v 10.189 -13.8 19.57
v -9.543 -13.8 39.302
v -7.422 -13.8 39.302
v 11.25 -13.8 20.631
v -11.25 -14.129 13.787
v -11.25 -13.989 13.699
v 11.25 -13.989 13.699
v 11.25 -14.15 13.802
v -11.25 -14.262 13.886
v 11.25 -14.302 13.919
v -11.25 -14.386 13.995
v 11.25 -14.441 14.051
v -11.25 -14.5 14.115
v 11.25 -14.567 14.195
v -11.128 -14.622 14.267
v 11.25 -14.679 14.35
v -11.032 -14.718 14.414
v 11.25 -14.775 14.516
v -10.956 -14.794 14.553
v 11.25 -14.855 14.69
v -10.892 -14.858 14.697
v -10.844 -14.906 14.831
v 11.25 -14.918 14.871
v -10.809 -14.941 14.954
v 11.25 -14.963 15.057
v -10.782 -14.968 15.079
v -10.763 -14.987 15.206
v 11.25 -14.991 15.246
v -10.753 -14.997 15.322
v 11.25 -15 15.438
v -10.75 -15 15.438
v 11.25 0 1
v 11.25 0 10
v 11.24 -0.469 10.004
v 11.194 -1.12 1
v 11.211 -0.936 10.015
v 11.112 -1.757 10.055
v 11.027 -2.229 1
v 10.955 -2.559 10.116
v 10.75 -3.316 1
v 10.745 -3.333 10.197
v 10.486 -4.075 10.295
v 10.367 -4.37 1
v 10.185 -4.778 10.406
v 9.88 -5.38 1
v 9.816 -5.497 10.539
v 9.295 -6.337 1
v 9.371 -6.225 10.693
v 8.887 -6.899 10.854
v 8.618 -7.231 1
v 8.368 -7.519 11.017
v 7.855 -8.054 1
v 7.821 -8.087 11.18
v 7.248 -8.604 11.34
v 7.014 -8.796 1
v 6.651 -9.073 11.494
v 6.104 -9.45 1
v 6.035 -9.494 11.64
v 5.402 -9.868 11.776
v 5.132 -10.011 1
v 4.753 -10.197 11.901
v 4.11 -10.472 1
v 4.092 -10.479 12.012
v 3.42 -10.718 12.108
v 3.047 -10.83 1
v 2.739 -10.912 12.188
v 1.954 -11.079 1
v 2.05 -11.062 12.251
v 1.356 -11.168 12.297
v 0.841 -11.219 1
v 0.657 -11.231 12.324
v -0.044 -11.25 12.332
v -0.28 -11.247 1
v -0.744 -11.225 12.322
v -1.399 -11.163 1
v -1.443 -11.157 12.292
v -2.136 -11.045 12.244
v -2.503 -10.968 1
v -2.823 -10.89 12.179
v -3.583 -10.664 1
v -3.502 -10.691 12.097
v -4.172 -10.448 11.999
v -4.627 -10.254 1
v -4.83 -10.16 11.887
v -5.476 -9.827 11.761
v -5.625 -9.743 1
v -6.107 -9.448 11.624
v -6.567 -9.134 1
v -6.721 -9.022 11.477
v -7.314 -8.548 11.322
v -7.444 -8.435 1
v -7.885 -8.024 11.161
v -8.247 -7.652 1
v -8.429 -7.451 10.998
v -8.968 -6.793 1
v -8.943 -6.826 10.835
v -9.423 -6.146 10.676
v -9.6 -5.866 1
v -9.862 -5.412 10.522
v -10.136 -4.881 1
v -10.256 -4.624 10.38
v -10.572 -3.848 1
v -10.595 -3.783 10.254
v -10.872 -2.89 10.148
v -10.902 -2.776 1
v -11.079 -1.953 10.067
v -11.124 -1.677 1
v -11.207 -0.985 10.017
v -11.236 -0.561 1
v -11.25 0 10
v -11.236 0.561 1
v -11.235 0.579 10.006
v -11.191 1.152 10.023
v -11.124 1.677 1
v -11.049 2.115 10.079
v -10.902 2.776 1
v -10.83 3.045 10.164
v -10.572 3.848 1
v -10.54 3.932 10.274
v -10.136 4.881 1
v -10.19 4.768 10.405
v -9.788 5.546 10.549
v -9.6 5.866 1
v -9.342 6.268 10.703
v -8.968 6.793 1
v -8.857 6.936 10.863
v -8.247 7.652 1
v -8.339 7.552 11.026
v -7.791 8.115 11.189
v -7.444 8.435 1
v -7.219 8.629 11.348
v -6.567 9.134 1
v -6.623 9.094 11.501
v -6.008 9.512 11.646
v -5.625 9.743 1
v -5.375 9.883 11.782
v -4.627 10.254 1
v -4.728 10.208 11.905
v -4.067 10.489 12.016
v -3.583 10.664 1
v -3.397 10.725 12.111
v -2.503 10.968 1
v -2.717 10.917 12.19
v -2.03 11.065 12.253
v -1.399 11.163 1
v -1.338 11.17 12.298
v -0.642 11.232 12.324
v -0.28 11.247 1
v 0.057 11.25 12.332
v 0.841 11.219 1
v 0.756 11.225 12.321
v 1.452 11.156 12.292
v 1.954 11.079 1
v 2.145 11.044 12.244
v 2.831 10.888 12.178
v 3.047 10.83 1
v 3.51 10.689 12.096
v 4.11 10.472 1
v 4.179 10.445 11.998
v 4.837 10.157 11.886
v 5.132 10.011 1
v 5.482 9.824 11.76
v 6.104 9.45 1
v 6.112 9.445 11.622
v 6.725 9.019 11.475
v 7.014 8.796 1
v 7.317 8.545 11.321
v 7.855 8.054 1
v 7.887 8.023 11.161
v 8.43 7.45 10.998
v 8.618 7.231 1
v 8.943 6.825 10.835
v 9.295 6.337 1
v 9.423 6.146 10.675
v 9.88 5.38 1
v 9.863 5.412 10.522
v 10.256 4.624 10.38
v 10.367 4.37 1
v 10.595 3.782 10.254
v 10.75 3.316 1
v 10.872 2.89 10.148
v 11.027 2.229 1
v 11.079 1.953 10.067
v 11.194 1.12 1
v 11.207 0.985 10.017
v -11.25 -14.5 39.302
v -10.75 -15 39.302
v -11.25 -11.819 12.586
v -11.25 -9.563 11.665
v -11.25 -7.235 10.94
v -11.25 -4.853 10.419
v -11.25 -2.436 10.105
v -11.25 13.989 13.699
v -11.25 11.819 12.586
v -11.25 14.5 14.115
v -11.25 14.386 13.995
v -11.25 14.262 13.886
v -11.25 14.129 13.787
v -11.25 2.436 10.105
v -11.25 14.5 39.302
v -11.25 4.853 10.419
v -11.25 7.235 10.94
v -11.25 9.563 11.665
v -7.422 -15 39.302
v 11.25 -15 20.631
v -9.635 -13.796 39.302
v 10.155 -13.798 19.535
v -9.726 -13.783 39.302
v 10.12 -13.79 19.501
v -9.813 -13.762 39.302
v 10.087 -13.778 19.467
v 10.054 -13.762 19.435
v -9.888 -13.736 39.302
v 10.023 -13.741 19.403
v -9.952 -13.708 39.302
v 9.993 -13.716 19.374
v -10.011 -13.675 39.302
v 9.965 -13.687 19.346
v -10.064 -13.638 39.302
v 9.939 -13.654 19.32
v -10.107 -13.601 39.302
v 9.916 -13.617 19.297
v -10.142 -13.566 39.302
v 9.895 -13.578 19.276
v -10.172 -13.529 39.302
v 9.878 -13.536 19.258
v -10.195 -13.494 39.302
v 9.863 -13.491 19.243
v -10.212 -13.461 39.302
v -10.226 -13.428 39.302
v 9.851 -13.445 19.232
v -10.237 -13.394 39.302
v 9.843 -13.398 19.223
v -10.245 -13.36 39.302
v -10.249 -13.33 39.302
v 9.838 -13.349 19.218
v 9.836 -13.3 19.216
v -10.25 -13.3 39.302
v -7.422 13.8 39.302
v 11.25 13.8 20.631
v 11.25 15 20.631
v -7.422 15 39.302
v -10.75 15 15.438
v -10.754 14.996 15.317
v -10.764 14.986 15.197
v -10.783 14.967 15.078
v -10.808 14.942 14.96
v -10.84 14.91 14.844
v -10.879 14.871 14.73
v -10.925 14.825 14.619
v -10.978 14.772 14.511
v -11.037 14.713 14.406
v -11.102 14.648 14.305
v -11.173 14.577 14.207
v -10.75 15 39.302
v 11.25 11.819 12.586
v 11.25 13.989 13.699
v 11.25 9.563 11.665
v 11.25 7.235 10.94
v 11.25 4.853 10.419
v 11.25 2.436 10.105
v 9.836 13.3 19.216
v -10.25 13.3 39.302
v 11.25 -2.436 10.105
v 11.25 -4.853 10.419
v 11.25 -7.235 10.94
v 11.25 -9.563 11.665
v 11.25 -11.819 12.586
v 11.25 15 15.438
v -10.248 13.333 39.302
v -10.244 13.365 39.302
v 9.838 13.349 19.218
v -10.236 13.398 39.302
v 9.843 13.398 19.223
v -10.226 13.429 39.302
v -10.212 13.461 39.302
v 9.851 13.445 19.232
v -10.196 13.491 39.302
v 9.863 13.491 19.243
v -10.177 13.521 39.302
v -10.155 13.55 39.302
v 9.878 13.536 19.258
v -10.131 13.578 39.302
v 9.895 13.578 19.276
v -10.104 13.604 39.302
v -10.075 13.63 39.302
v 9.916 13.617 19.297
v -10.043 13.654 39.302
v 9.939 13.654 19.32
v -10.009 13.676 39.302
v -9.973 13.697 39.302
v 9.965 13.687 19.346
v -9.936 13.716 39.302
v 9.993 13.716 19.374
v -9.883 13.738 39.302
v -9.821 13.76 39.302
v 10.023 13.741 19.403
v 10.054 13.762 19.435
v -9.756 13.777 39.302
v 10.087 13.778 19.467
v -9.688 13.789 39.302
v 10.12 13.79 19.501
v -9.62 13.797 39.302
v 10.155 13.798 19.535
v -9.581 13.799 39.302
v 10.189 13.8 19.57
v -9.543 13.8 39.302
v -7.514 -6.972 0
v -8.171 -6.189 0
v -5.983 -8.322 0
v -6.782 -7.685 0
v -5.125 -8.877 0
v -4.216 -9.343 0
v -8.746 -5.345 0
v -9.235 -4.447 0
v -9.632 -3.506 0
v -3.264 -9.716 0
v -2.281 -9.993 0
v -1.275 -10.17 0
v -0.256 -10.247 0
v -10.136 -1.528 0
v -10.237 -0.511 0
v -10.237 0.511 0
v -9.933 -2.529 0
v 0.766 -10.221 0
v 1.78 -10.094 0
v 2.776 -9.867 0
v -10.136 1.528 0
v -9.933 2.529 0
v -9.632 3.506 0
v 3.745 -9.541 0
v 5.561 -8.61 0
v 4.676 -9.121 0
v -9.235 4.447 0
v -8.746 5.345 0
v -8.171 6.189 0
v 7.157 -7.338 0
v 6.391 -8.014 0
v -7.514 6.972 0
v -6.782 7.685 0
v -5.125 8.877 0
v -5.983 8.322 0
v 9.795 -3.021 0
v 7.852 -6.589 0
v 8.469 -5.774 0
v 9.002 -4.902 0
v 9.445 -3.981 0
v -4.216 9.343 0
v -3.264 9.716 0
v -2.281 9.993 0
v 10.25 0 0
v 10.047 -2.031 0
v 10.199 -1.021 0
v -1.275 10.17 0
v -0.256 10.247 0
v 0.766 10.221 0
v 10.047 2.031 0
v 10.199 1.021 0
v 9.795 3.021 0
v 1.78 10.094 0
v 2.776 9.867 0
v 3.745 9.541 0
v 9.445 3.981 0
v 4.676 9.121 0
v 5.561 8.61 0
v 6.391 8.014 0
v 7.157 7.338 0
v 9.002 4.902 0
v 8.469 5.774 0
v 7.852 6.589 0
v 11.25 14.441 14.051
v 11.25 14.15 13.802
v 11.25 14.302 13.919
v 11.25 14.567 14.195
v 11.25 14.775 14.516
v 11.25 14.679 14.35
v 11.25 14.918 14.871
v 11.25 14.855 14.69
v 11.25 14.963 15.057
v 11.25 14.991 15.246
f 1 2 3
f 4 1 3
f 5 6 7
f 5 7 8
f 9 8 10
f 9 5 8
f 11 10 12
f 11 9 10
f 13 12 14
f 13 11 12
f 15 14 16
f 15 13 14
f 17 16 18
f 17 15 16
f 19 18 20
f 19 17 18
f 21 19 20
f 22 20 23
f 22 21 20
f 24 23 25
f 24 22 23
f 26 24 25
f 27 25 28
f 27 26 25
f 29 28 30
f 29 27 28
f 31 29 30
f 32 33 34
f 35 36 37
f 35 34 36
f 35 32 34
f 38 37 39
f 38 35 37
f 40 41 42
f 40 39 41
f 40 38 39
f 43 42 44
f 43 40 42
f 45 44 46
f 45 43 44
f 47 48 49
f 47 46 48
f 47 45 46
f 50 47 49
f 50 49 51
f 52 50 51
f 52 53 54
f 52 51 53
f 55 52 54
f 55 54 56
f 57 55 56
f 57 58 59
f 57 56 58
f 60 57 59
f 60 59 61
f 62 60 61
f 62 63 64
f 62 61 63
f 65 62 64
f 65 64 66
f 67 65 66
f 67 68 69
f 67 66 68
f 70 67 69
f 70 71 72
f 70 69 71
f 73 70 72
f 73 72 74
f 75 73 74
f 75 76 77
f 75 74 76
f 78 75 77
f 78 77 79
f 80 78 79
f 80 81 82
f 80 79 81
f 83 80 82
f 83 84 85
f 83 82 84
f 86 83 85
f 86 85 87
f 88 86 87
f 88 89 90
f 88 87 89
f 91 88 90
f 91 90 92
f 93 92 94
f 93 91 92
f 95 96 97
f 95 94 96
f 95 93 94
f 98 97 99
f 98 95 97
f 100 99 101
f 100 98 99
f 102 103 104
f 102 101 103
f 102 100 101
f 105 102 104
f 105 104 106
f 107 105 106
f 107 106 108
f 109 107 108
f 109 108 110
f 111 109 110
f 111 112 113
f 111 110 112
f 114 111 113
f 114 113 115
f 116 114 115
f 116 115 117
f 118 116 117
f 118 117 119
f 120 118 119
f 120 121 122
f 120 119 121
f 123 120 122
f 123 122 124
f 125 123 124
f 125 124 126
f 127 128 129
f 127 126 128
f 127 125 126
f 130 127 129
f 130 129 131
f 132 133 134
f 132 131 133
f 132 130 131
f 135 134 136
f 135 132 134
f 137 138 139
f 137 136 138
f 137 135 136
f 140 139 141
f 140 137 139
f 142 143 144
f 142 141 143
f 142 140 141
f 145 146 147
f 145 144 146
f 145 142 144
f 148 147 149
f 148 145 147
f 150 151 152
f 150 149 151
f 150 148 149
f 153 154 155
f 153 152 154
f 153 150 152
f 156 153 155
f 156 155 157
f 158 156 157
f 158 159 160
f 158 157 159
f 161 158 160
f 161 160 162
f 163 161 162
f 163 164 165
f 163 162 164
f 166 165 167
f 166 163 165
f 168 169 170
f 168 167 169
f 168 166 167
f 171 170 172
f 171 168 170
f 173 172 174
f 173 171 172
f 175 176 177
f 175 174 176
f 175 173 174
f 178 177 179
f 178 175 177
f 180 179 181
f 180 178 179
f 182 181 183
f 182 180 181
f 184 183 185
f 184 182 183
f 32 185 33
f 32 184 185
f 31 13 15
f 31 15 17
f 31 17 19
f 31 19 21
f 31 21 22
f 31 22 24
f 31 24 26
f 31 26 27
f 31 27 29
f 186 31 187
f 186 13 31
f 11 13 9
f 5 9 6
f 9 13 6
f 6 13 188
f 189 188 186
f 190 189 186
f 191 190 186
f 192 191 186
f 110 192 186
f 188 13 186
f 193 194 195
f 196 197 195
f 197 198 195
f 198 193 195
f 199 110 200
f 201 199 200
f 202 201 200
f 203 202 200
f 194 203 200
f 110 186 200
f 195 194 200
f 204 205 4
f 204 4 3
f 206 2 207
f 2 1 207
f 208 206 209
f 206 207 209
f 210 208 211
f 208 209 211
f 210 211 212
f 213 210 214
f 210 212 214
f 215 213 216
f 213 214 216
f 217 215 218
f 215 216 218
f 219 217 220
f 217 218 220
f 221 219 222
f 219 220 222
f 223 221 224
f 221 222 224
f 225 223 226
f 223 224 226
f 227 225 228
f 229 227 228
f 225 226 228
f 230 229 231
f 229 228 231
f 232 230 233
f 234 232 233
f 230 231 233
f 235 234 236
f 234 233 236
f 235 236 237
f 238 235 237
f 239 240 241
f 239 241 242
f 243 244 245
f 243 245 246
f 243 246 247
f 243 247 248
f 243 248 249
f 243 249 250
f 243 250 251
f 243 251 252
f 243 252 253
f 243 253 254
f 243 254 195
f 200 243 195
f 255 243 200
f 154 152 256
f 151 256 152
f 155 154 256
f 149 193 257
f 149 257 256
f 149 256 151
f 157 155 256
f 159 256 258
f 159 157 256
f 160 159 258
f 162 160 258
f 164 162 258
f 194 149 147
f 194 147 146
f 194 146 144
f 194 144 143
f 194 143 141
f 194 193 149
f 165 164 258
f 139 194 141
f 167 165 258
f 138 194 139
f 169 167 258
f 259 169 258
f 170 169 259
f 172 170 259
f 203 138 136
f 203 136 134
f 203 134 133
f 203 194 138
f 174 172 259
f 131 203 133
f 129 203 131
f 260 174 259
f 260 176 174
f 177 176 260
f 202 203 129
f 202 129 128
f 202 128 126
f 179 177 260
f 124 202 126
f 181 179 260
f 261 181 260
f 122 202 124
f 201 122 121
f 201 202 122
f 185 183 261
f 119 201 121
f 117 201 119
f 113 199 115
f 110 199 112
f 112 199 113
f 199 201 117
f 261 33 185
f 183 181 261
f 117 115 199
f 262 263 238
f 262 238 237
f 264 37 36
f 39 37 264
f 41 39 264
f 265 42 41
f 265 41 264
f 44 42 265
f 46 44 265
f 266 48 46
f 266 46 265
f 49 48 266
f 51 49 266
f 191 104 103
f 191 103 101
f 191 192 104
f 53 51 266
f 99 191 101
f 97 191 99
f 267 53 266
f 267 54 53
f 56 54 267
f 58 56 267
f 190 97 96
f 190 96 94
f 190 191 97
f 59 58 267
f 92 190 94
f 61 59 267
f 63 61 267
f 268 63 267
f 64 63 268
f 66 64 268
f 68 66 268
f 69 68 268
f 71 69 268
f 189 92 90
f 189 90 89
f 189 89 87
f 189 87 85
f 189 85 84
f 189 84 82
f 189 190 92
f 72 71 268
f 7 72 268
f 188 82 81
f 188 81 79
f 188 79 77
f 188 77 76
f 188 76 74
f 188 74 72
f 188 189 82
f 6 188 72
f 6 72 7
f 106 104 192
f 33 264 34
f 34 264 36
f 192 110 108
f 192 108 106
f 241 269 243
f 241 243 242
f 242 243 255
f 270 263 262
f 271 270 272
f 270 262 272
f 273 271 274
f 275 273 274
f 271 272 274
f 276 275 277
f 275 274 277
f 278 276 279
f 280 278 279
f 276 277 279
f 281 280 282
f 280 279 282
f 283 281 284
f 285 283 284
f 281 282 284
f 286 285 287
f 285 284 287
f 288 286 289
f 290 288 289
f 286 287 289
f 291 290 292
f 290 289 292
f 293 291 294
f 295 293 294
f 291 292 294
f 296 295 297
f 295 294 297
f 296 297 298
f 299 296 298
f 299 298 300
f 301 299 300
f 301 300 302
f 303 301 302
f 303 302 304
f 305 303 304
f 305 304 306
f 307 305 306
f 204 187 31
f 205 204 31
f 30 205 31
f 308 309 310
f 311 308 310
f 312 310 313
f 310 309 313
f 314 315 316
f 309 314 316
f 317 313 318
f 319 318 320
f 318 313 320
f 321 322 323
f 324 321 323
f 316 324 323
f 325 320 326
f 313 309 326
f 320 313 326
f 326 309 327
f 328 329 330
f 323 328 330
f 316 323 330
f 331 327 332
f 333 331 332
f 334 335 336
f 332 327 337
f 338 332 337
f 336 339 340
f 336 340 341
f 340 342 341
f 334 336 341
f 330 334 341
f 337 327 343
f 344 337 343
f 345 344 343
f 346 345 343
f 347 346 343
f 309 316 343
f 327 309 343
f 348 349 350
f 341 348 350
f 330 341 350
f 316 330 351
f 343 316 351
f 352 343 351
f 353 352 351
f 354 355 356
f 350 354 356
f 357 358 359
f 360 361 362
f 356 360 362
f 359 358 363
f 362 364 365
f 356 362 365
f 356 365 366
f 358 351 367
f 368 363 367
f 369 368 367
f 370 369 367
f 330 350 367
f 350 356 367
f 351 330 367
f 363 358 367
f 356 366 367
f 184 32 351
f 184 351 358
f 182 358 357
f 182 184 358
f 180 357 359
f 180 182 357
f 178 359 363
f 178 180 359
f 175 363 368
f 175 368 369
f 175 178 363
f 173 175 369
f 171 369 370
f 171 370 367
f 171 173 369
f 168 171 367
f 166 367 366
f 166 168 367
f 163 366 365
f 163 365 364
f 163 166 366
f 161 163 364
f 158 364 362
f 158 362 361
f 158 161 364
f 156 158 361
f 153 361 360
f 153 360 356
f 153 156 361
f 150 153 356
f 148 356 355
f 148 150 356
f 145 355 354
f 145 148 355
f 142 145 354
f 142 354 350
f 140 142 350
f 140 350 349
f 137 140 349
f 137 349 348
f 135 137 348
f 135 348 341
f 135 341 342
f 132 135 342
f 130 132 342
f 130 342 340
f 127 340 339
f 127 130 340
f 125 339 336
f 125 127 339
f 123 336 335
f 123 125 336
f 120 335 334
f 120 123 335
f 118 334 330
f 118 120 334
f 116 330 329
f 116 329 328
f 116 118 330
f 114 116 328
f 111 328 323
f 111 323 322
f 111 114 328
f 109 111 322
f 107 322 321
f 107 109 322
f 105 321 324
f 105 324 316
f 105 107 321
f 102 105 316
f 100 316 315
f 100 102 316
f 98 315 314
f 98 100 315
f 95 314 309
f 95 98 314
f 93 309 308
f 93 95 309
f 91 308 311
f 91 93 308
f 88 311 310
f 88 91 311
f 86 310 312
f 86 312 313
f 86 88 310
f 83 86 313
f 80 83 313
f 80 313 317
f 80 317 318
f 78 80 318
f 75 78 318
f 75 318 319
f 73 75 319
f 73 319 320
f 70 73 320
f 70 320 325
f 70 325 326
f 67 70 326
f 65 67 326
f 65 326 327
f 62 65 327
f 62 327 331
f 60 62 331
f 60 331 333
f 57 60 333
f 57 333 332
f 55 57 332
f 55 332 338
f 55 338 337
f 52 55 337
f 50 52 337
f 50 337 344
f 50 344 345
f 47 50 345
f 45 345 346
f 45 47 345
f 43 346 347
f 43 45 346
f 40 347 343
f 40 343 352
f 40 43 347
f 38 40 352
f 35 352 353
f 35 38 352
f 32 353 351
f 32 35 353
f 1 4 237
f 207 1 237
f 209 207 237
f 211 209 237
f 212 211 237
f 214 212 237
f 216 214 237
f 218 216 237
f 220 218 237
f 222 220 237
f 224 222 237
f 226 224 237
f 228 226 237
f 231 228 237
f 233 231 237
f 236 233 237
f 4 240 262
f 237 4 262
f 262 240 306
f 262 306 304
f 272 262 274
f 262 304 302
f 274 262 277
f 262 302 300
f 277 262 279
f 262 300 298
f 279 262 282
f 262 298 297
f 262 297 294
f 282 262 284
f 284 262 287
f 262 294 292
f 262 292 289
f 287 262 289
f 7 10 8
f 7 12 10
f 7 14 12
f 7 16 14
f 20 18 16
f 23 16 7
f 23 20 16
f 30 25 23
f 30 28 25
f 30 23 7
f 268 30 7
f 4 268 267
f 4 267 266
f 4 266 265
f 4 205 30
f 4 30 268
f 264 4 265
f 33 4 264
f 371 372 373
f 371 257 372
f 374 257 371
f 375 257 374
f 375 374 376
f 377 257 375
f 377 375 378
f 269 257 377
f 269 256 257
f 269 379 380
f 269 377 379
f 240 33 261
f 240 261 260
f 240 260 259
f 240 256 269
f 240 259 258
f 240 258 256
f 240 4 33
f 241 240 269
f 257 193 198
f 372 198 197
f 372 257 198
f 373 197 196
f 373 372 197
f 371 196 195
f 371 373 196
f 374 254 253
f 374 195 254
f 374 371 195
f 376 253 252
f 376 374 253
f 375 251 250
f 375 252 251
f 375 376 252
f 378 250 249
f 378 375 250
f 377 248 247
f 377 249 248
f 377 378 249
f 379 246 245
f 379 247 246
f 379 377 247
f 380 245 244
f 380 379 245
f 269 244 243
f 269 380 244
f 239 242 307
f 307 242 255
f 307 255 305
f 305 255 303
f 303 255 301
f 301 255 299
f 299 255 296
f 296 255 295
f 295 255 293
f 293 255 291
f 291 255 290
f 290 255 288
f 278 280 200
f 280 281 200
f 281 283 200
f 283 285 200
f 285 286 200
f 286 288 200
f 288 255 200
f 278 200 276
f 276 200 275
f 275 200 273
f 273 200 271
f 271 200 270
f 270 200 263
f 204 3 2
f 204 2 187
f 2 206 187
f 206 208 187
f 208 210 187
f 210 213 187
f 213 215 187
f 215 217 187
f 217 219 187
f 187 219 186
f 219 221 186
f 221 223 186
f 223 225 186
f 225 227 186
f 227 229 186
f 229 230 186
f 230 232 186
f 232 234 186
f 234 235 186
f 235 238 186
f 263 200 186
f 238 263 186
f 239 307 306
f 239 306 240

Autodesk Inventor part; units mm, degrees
ref_plane "YZ Plane" through (0, 0, 0) normal (1, 0, 0) x (0, 1, 0)
ref_plane "XZ Plane" through (0, 0, 0) normal (0, 1, 0) x (-1, 0, 0)
ref_plane "XY Plane" through (0, 0, 0) normal (0, 0, 1) x (1, 0, 0)
sketch "Sketch1" plane through (0, 0, 0) normal (1, 0, 0) x (0, 1, 0)
  circle A0 centre (0, 38.3) radius 28.3
  line L0 (-15, 14.3023) -> (15, 14.3023)
  line L1 (15, 14.3023) -> (15, 39.3023)
  line L2 (15, 39.3023) -> (-15, 39.3023)
  line L3 (-15, 39.3023) -> (-15, 14.3023)
  point P0 (0, 0)
  point P1 (0, 10)
  dimension "d0" = 56.6
  dimension "d1" = 10
  dimension "d2" = 25
  dimension "d3" = 30
extrude "Extrusion1" add sketch "Sketch1" along normal mid plane 22.5 contours L0 A0 | L3 L2 L1 L0
sketch "Sketch2" plane through (0, 0, 0) normal (0, 0, 1) x (1, 0, 0)
  circle A0 centre (0, 0) radius 11.25
  dimension "d6" = 22.5
extrude "Extrusion2" add sketch "Sketch2" along normal up to surface
sketch "Sketch3" plane through (-11.25, 0, 14.3023) normal (0, -1, 0) x (1, 0, 0)
  line L0 (0, 25) -> (22.5, 25) projected
  line L1 (22.5, 25) -> (22.5, 0) projected
  line L2 (1, 25) -> (22.5, 3.5)
  line L3 (22.5, 6.3284) -> (21.0858, 4.9142)
  line L4 (0, 0) -> (0, 25) projected
  point P0 (11.25, -14.3023)
  dimension "d12" = 45
  dimension "d13" = 1
  dimension "d14" = 2
extrude "Extrusion3" cut sketch "Sketch3" along normal mid plane 27.6 contours L0 L1 L3 L2
sketch "Sketch4" plane through (0, 0, 0) normal (0, 1, 0) x (-1, 0, 0)
  line L0 (-11.25, 14.3023) -> (-11.25, 39.3023) projected
  line L1 (-11.25, 20.6307) -> (7.4216, 39.3023)
  line L2 (10.25, 39.3023) -> (-11.25, 39.3023) projected
  line L3 (-9.8358, 19.2165) -> (10.25, 39.3023) projected
  point P0 (0, 0)
extrude "Extrusion4" cut sketch "Sketch4" along normal through all both and the other way through all
fillet "Fillet1" radius 0.5 2 edges at (-0.2071, 13.8, 29.2594) (-0.2071, -13.8, 29.2594)
chamfer "Chamfer1" distance 1 angle 45 1 edges at (-11.25, 0, 0)
chamfer "Chamfer2" distance 0.5 angle 45 2 edges at (-11.25, 15, 26.8023) (-11.25, -15, 26.8023)
fillet "Fillet2" radius 2 2 edges at (0.25, -15, 14.3023) (0.25, 15, 14.3023)
equation "\"d3\" = width"
equation "\"d10\" = sample_cut"
equation "\"width\" = 30"
equation "\"sample_cut\" = 27.6"
properties part number "pld-target-holder" material "ABS Plastic"
